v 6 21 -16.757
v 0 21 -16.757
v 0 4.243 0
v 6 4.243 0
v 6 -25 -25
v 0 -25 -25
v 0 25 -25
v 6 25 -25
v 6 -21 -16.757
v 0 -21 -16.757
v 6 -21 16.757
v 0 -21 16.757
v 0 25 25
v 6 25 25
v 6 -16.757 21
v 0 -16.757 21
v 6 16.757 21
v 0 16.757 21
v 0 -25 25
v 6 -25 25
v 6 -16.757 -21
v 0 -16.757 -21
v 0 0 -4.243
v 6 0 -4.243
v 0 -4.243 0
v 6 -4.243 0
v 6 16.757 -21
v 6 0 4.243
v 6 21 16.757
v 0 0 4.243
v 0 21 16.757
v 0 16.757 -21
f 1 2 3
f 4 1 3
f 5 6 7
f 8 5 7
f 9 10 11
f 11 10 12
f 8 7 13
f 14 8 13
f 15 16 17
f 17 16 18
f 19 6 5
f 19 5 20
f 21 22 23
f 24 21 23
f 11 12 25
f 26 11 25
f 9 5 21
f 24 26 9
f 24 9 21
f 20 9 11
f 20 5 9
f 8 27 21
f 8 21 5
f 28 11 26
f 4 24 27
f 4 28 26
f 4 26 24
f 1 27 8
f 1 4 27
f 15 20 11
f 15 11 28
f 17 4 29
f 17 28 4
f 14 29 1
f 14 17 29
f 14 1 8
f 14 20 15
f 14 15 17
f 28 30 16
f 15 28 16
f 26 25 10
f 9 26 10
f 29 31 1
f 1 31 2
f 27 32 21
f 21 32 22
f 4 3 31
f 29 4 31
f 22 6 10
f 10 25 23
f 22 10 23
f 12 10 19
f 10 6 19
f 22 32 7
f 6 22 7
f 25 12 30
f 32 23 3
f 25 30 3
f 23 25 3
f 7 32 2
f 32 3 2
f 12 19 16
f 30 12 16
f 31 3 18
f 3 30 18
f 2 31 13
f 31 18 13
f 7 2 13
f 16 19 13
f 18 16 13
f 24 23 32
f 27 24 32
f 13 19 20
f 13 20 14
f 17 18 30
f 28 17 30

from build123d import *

# Parameters (mm, degrees)
SKETCH1_W           = 50
SKETCH1_H           = 50
BOSS_EXTRUDE1_DEPTH = 6


with BuildPart() as part:
    # Sketch1 → Boss-Extrude1 (new body)
    with BuildSketch(Plane.YZ):
        Rectangle(SKETCH1_W, SKETCH1_H)
        Polygon((4.242640687, 0), (21, 16.757359313), (21, -16.757359313), align=None, mode=Mode.SUBTRACT)
        Polygon((16.757359313, 21), (0, 4.242640687), (-16.757359313, 21), align=None, mode=Mode.SUBTRACT)
        Polygon((-21, 16.757359313), (-4.242640687, 0), (-21, -16.757359313), align=None, mode=Mode.SUBTRACT)
        Polygon((-16.757359313, -21), (0, -4.242640687), (16.757359313, -21), align=None, mode=Mode.SUBTRACT)
    extrude(amount=BOSS_EXTRUDE1_DEPTH)


solid = part.part
